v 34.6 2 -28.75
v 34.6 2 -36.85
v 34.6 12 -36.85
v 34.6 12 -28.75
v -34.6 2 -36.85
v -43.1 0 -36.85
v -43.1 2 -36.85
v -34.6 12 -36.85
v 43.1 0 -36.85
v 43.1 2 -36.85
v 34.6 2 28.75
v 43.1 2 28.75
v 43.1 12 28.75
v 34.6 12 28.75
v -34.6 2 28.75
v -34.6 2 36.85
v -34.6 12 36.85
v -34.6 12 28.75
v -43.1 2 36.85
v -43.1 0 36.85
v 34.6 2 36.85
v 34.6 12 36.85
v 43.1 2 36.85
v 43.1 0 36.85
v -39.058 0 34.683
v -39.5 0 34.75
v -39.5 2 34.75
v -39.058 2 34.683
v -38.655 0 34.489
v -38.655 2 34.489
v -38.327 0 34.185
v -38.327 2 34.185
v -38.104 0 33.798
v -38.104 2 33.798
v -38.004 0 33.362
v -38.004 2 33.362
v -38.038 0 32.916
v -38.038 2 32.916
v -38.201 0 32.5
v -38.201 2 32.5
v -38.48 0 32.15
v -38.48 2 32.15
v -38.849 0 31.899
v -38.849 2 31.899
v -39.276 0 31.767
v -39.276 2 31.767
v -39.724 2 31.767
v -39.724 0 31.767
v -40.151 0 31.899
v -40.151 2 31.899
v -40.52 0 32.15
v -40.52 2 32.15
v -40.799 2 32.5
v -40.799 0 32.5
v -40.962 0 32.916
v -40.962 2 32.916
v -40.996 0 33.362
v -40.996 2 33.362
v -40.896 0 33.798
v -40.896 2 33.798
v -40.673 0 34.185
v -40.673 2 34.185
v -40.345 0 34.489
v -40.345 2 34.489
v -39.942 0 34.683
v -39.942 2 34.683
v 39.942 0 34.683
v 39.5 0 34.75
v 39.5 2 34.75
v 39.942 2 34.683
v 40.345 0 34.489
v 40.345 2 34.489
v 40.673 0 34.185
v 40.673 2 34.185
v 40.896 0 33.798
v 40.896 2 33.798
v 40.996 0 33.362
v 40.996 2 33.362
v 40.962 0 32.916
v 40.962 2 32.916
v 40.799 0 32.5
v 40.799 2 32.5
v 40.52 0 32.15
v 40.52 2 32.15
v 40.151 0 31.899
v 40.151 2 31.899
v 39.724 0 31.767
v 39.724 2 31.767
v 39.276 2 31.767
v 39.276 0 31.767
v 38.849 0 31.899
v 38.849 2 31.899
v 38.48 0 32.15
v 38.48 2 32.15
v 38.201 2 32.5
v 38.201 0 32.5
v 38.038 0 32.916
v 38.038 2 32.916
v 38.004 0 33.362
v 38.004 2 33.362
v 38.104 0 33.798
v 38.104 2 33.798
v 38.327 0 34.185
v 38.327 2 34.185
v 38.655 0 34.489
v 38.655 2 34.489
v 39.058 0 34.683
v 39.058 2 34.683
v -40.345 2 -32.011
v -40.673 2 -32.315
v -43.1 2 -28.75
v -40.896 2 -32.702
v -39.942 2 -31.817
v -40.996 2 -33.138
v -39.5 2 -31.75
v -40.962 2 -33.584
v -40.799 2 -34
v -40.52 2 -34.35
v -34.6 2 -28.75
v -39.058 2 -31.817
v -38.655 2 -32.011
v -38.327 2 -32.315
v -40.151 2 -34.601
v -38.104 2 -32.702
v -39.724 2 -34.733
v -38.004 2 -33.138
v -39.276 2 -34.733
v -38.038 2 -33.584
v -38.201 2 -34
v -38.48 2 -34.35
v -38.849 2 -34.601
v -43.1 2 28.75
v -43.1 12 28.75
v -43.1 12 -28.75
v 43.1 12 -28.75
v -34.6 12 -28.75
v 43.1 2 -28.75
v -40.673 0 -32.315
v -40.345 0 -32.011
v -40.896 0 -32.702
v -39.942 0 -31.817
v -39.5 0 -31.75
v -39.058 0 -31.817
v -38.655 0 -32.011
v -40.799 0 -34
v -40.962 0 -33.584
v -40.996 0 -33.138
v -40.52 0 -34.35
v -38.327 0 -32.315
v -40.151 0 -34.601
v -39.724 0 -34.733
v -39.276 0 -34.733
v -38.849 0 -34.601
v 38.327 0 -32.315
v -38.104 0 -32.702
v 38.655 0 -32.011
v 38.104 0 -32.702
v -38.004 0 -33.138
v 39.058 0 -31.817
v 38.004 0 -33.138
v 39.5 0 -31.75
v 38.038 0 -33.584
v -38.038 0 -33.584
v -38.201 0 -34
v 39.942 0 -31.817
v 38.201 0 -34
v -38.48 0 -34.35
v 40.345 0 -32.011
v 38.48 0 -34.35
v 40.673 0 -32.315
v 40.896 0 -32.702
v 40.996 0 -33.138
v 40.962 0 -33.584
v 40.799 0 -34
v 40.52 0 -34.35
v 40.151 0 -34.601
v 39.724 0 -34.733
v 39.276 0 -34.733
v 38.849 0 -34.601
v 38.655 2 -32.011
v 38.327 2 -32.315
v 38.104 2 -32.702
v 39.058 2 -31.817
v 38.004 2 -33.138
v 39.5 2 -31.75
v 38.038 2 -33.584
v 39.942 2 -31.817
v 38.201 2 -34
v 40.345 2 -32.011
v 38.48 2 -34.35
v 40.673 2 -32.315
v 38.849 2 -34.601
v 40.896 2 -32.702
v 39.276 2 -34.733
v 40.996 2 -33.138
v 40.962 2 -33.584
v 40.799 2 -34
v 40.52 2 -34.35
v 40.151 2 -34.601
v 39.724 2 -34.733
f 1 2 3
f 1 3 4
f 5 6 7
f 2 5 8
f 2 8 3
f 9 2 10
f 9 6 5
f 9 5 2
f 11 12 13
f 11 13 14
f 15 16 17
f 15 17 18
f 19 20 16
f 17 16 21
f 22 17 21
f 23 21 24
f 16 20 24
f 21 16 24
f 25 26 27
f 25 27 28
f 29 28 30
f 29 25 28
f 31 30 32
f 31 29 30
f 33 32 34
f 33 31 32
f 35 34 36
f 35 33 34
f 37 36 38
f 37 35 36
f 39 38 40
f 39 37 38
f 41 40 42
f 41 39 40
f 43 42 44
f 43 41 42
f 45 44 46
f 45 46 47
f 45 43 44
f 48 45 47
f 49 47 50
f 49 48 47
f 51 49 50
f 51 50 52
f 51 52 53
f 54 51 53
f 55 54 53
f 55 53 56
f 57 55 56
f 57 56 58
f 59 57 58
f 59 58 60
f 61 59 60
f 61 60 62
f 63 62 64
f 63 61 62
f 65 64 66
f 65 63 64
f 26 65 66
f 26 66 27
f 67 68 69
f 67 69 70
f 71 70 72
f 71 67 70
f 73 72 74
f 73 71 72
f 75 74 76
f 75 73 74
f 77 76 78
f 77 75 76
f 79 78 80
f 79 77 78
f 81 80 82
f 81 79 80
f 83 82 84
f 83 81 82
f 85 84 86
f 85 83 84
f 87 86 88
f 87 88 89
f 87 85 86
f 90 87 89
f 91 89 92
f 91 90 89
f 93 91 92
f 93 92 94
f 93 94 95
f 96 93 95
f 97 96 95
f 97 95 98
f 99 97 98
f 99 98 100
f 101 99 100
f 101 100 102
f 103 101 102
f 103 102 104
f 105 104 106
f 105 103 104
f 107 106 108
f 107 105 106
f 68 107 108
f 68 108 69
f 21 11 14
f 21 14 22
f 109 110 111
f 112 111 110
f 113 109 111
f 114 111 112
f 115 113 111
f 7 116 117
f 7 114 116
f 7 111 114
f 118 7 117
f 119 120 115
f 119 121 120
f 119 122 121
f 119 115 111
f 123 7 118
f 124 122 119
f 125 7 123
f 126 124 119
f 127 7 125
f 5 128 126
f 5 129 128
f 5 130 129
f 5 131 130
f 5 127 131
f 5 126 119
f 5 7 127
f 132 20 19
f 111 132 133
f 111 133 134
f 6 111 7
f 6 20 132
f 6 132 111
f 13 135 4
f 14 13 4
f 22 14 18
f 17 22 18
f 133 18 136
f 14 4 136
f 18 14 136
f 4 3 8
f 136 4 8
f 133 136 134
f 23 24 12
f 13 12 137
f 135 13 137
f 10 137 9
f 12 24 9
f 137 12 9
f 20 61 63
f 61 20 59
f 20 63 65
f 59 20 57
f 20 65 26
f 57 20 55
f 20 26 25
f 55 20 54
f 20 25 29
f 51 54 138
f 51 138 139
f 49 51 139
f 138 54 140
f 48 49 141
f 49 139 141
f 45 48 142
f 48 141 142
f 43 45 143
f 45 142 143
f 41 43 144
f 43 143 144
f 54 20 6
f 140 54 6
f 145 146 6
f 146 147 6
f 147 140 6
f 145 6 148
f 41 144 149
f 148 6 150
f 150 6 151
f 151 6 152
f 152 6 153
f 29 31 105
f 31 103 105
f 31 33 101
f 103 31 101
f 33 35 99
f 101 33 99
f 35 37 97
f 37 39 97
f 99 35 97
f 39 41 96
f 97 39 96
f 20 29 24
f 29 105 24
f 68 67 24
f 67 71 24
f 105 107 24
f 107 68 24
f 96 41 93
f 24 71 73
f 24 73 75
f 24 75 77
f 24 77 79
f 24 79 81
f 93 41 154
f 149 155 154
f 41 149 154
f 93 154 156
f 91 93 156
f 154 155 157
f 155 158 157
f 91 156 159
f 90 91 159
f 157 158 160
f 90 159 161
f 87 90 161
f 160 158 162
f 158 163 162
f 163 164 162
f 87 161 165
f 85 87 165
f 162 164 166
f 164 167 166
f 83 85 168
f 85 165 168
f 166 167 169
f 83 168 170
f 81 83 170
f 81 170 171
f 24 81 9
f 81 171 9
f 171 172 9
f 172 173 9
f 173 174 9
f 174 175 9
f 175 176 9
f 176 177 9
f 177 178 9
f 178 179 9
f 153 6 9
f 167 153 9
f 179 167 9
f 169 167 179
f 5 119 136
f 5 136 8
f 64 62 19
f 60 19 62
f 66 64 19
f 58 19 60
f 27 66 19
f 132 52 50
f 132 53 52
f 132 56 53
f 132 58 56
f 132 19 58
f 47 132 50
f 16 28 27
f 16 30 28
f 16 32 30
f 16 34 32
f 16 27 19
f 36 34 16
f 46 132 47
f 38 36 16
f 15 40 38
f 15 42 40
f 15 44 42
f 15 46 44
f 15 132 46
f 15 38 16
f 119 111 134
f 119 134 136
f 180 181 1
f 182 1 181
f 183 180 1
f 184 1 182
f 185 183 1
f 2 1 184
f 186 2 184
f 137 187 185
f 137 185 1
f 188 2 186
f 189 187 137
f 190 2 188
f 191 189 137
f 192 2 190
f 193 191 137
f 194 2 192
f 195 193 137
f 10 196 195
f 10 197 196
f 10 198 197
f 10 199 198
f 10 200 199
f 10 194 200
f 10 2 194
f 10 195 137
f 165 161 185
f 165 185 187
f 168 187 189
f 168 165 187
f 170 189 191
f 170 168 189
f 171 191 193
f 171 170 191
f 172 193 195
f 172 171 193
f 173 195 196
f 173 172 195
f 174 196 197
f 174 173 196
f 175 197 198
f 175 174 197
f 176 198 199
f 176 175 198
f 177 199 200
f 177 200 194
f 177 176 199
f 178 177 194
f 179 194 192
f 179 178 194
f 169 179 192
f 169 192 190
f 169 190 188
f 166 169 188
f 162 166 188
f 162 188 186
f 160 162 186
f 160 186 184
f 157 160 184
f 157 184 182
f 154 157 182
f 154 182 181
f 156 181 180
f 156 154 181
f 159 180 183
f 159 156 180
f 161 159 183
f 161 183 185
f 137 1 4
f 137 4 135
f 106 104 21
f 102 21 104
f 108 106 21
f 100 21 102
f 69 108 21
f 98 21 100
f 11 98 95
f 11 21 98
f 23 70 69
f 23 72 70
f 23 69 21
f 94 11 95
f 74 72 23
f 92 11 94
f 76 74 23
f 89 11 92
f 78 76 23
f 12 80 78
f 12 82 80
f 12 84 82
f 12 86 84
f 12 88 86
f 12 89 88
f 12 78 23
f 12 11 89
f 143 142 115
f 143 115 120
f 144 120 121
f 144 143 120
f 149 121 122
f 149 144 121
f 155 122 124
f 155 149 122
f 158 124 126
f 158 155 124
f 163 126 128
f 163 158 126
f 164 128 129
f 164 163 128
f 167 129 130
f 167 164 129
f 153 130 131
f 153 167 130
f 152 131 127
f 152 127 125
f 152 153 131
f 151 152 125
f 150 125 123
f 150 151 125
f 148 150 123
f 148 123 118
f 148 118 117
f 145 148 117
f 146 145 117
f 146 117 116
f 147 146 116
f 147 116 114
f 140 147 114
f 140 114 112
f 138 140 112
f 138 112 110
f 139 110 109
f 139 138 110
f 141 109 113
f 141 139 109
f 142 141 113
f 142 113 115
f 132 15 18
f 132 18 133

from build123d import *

# Parameters (mm, degrees)
SKETCH_1_W      = 86.2
SKETCH_1_H      = 73.7
SKETCH_1_R      = 1.5
EXTRUDE_1_DEPTH = 2
EXTRUDE_2_DEPTH = 10


with BuildPart() as part:
    # 草图1 → 凸台-拉伸1 (new body)
    with BuildSketch(Plane(origin=(0, 0, 0), x_dir=(1, 0, 0), z_dir=(0, 1, 0))):
        Rectangle(SKETCH_1_W, SKETCH_1_H)
        with Locations(Location((-39.5, 33.25, 0), (0, 0, 270))):
            Circle(SKETCH_1_R, mode=Mode.SUBTRACT)
        with Locations(Location((39.5, 33.25, 0), (0, 0, 270))):
            Circle(SKETCH_1_R, mode=Mode.SUBTRACT)
        with Locations(Location((-39.5, -33.25, 0), (0, 0, 270))):
            Circle(SKETCH_1_R, mode=Mode.SUBTRACT)
        with Locations(Location((39.5, -33.25, 0), (0, 0, 270))):
            Circle(SKETCH_1_R, mode=Mode.SUBTRACT)
    extrude(amount=EXTRUDE_1_DEPTH)

    # 草图2 → 凸台-拉伸2 (add)
    with BuildSketch(Plane(origin=(0, 2, 0), x_dir=(1, 0, 0), z_dir=(0, 1, 0))):
        Polygon((-34.6, 36.85), (34.6, 36.85), (34.6, 28.75), (43.1, 28.75), (43.1, -28.75), (34.6, -28.75), (34.6, -36.85), (-34.6, -36.85), (-34.6, -28.75), (-43.1, -28.75), (-43.1, 28.75), (-34.6, 28.75), align=None)
    extrude(amount=EXTRUDE_2_DEPTH)


solid = part.part
